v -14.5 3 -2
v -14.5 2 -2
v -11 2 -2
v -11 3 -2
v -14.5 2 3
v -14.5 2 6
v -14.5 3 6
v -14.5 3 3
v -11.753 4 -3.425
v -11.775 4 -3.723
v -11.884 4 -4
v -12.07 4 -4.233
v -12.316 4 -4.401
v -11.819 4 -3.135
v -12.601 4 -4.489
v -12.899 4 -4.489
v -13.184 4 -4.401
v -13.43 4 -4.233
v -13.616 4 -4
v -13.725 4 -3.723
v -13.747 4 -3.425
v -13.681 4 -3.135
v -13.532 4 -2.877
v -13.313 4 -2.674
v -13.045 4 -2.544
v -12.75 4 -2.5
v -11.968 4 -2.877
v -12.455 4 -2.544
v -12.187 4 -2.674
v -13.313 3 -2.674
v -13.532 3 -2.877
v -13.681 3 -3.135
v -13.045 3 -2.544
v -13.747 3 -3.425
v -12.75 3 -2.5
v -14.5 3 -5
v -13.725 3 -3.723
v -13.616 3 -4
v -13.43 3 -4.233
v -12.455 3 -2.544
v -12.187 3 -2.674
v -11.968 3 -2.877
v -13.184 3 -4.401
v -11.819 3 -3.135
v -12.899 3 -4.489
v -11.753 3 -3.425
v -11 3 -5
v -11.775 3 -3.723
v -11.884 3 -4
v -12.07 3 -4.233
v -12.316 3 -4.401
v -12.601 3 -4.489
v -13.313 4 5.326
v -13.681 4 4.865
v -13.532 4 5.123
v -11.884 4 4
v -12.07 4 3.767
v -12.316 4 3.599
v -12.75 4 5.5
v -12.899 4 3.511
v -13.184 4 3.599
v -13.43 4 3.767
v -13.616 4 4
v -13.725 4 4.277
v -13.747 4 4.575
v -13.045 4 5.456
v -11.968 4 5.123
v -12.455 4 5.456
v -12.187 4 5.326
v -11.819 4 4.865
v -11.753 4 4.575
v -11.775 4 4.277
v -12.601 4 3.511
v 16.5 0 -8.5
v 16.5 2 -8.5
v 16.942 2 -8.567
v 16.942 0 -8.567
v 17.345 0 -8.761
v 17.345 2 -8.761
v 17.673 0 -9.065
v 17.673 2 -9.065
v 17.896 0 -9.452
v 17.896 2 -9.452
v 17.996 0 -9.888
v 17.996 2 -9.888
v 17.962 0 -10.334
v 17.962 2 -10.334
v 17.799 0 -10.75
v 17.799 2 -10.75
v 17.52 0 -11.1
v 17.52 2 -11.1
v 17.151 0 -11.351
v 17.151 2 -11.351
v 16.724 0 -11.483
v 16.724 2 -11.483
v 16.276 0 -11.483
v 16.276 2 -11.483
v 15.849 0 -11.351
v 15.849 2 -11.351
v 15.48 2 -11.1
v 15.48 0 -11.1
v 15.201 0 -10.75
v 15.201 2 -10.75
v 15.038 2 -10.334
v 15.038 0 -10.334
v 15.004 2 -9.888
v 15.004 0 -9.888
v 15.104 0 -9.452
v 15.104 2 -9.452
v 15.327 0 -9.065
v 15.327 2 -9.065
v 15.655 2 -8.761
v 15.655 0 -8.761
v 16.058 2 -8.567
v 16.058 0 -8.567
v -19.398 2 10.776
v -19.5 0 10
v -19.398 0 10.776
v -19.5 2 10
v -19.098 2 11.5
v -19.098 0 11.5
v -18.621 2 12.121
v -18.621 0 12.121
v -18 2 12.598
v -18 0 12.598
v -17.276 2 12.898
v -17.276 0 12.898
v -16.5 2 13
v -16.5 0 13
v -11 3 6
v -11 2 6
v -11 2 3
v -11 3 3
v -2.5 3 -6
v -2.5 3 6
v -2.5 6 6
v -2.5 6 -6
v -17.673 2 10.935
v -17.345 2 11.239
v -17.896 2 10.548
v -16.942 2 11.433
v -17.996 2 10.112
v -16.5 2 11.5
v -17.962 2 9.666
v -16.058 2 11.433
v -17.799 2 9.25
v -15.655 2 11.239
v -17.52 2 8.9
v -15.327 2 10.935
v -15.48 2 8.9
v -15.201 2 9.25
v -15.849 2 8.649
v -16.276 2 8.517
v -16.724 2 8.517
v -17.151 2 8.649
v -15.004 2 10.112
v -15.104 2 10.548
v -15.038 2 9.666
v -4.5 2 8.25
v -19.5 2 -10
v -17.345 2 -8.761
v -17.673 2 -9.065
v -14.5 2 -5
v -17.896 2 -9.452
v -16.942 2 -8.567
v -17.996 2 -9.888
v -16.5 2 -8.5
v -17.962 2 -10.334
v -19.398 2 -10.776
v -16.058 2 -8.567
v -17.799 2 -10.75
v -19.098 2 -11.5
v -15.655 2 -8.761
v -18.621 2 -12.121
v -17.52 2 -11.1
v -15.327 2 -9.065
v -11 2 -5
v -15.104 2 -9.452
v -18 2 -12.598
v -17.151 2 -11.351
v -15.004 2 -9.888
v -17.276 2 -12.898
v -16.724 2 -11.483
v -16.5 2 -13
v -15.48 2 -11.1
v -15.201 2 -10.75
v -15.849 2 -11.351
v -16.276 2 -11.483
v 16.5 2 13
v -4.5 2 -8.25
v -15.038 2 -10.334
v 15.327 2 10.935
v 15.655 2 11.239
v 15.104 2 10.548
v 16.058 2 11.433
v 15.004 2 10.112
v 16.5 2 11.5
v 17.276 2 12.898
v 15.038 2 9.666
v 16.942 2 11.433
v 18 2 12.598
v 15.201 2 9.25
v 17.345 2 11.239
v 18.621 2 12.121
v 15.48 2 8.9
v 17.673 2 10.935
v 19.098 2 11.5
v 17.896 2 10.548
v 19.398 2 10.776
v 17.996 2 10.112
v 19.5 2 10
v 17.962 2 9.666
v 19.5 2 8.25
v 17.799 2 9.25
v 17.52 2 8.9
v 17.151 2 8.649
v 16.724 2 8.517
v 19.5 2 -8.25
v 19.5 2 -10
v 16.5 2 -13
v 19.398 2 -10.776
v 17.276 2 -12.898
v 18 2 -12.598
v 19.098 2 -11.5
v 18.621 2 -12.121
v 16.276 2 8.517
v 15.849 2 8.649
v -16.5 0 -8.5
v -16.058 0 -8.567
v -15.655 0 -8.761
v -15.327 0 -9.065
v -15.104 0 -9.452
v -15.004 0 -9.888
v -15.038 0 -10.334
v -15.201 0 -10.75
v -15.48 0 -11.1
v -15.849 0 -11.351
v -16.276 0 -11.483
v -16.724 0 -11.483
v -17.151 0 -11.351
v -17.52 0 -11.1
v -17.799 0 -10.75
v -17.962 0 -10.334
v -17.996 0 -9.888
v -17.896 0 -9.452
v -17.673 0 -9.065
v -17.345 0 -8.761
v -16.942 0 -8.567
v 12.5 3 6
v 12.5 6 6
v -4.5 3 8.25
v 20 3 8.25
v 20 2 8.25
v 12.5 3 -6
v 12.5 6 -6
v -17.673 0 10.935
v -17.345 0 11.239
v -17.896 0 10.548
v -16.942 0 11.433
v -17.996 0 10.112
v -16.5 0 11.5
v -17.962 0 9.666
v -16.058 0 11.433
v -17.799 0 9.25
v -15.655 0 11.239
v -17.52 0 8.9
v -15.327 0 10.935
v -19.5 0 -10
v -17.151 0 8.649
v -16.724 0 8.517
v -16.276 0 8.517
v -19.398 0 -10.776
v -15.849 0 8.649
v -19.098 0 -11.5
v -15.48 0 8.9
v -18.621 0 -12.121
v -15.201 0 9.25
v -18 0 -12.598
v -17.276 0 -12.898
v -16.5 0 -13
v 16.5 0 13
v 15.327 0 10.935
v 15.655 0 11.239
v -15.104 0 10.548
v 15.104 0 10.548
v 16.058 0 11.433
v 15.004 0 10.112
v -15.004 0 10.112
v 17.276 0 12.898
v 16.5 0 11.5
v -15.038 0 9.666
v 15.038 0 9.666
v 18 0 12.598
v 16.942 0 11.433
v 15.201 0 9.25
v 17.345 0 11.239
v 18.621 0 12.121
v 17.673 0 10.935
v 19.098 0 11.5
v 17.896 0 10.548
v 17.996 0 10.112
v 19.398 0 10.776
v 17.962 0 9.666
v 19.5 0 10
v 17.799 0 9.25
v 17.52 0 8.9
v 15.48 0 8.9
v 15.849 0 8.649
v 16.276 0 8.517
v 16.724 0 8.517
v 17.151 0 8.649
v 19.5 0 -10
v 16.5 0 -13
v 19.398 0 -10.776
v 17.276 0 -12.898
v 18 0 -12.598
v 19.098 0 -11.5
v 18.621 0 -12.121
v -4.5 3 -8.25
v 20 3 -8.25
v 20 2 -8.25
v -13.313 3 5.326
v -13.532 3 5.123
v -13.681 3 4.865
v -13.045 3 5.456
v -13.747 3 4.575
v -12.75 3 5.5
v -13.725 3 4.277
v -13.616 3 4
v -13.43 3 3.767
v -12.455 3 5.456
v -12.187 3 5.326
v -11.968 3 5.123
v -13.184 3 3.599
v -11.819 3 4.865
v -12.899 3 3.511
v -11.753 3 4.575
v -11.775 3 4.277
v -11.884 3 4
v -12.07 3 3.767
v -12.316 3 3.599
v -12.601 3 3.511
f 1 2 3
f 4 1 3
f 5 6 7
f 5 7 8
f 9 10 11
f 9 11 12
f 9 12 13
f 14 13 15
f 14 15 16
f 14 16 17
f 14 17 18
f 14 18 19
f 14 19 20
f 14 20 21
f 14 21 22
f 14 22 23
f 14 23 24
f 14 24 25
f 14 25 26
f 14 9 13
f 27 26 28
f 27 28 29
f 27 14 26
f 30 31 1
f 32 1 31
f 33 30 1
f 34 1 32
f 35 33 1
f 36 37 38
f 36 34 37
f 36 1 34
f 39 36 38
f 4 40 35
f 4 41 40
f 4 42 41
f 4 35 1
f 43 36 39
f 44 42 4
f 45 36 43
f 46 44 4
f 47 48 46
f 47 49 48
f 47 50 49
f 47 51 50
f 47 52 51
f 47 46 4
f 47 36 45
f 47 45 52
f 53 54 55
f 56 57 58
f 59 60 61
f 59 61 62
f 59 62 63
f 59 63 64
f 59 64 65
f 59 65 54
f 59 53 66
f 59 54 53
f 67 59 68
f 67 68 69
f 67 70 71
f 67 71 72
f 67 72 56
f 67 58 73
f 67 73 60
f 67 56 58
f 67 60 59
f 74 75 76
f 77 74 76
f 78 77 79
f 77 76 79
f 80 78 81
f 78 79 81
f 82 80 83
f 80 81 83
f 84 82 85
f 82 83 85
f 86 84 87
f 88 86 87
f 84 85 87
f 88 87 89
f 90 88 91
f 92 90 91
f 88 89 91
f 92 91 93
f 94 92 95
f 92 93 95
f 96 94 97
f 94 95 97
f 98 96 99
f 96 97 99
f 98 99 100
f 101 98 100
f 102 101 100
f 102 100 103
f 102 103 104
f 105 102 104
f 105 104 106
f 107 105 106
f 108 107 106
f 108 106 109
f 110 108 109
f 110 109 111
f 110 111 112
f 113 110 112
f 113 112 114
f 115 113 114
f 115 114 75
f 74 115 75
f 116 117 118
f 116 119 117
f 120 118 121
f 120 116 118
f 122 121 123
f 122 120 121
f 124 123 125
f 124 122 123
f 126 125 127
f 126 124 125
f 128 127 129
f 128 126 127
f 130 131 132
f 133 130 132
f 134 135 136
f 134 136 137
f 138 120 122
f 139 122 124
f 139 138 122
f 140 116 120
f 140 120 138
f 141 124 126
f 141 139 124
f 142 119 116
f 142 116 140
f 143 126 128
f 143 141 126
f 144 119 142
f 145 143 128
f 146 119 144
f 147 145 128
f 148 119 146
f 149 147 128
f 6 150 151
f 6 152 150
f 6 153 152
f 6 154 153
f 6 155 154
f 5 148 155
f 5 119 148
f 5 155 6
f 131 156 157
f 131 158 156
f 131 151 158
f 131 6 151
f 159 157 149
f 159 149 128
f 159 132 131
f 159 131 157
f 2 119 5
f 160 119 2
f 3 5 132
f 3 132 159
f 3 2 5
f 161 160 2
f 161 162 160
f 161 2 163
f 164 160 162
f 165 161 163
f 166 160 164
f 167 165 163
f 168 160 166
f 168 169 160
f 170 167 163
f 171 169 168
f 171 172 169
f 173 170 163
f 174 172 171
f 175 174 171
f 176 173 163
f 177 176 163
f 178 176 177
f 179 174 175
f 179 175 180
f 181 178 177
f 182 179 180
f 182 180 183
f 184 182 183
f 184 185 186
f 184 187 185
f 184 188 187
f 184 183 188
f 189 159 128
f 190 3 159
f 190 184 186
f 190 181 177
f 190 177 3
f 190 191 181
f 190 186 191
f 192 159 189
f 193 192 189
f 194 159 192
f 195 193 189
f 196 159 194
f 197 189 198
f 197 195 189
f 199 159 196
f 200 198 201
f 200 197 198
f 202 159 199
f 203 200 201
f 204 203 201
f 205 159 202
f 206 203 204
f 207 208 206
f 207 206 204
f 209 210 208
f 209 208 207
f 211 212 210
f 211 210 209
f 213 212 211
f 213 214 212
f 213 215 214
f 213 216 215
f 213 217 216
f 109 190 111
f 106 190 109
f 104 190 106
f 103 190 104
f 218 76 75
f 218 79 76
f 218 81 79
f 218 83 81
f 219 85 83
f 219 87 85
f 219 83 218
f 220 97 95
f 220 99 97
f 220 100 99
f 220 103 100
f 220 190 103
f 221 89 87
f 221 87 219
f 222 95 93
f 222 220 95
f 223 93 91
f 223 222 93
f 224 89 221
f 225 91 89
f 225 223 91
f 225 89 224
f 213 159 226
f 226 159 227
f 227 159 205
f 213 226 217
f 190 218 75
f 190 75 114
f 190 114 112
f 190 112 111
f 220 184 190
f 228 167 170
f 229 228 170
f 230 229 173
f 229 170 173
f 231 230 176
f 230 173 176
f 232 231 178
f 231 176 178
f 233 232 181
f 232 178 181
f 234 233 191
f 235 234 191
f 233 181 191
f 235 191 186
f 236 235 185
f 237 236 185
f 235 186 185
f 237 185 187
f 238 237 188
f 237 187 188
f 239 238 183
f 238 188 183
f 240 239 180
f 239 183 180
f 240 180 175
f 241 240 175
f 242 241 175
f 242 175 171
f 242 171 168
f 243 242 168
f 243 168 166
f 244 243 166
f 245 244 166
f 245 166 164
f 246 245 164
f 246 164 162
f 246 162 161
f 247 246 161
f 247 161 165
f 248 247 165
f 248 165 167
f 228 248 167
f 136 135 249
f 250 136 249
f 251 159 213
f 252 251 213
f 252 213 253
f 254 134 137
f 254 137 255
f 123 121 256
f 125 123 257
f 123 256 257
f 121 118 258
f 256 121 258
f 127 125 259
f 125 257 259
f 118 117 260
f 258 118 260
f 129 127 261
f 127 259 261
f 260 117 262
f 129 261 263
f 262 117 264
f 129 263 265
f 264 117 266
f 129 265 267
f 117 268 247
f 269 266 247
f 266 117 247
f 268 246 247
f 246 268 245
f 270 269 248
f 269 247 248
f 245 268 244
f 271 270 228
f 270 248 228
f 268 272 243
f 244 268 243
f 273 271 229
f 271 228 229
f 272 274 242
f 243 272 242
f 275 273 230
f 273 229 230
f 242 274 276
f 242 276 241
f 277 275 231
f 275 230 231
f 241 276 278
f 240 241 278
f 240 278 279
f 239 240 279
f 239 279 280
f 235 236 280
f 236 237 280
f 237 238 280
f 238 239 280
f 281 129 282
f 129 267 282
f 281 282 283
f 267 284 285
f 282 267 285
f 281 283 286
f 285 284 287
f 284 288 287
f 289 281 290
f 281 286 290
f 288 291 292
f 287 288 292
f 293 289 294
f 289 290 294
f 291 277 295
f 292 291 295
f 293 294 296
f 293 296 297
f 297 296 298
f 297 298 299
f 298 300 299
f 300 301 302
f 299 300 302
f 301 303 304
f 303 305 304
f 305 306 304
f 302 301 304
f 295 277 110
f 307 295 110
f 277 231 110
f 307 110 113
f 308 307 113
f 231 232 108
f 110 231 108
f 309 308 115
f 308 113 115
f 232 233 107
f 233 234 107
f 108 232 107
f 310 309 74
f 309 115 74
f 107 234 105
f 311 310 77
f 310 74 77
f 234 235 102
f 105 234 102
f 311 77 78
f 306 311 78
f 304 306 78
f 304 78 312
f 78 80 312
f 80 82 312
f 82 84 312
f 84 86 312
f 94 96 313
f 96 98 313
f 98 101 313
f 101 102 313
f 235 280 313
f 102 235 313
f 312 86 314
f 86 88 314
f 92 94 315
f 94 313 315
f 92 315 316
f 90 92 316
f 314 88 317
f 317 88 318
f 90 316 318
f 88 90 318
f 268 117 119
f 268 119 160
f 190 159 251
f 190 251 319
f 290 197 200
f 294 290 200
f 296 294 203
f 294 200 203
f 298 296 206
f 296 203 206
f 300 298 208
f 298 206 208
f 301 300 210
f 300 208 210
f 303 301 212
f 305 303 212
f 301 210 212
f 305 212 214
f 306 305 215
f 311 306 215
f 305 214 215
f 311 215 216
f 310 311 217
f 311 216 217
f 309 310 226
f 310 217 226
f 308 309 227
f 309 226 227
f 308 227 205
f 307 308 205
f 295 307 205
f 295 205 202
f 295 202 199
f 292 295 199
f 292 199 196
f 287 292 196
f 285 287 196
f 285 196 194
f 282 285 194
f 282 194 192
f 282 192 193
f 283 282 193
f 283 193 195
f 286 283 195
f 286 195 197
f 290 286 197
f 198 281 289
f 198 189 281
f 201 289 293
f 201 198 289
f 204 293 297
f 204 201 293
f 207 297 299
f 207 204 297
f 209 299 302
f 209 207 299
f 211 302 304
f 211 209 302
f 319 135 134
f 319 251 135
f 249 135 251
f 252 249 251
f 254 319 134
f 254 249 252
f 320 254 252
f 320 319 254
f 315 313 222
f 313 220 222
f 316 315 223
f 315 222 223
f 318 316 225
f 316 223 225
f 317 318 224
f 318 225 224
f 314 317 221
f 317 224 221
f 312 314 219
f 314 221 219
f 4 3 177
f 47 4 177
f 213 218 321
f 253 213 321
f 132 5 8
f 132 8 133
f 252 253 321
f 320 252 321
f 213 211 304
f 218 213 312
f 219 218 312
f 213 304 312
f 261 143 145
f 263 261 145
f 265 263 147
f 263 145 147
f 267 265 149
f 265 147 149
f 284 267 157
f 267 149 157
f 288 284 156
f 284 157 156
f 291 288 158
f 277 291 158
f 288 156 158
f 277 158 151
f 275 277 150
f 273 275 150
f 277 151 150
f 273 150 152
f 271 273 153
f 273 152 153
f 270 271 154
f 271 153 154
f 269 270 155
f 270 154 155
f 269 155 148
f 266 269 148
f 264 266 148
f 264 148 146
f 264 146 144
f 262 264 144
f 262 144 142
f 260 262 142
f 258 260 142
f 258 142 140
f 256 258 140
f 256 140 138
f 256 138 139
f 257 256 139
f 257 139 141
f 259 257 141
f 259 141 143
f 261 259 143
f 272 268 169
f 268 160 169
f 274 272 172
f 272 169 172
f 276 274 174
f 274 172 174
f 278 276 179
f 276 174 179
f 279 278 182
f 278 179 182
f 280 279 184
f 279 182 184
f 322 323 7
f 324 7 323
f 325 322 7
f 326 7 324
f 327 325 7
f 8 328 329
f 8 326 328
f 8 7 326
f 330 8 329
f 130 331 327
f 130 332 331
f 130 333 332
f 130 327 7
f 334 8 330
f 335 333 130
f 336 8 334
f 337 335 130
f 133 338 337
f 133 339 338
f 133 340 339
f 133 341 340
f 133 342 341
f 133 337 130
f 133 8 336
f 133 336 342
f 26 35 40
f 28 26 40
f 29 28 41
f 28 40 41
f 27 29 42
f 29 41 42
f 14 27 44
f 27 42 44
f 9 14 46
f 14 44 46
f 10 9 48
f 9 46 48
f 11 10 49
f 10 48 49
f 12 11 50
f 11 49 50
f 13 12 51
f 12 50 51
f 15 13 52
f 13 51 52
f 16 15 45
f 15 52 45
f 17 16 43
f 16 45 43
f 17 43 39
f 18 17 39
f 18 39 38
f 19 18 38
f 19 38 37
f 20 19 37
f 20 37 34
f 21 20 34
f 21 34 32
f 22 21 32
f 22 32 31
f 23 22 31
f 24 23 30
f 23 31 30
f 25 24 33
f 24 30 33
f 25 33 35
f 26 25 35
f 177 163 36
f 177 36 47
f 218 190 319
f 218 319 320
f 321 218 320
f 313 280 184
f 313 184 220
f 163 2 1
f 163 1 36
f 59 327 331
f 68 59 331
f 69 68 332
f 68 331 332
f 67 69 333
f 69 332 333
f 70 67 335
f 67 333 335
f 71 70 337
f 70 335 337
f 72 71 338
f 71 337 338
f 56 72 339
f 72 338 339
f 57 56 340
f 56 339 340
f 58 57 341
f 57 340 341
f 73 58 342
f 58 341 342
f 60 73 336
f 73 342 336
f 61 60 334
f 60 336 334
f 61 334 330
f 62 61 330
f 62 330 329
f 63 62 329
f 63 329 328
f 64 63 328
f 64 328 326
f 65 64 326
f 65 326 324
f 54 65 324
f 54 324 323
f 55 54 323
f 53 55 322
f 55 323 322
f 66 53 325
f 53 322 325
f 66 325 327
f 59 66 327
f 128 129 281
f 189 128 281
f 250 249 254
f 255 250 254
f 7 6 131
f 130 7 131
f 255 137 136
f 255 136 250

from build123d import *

# Parameters (mm, degrees)
SKETCH1_W           = 39
SKETCH1_H           = 26
BOSS_EXTRUDE1_DEPTH = 2
SKETCH2_R           = 1.5
CUT_EXTRUDE1_DEPTH  = 24.521266973
SKETCH3_W           = 24.5
SKETCH3_H           = 16.5
BOSS_EXTRUDE2_DEPTH = 1
SKETCH4_W           = 15
SKETCH4_H           = 12
BOSS_EXTRUDE3_DEPTH = 3
SKETCH5_W           = 3.5
SKETCH5_H           = 3
BOSS_EXTRUDE4_DEPTH = 1
SKETCH6_R           = 1
BOSS_EXTRUDE5_DEPTH = 1
FILLET1_R           = 3


with BuildPart() as part:
    # Sketch1 → Boss-Extrude1 (new body)
    with BuildSketch(Plane(origin=(0, 0, 0), x_dir=(1, 0, 0), z_dir=(0, 1, 0))):
        Rectangle(SKETCH1_W, SKETCH1_H)
    extrude(amount=BOSS_EXTRUDE1_DEPTH)

    # Sketch2 → Cut-Extrude1 (cut, through all)
    with BuildSketch(Plane(origin=(0, 2, 0), x_dir=(1, 0, 0), z_dir=(0, 1, 0))):
        with Locations(Location((-16.5, 10, 0), (0, 0, 270))):
            Circle(SKETCH2_R)
        with Locations(Location((-16.5, -10, 0), (0, 0, 270))):
            Circle(SKETCH2_R)
        with Locations(Location((16.5, -10, 0), (0, 0, 270))):
            Circle(SKETCH2_R)
        with Locations(Location((16.5, 10, 0), (0, 0, 270))):
            Circle(SKETCH2_R)
    extrude(amount=-CUT_EXTRUDE1_DEPTH, mode=Mode.SUBTRACT)

    # Sketch3 → Boss-Extrude2 (add)
    with BuildSketch(Plane(origin=(0, 2, 0), x_dir=(1, 0, 0), z_dir=(0, 1, 0))):
        with Locations((7.75, 0)):
            Rectangle(SKETCH3_W, SKETCH3_H)
    extrude(amount=BOSS_EXTRUDE2_DEPTH)

    # Sketch4 → Boss-Extrude3 (add)
    with BuildSketch(Plane(origin=(0, 3, 0), x_dir=(1, 0, 0), z_dir=(0, 1, 0))):
        with Locations((5, 0)):
            Rectangle(SKETCH4_W, SKETCH4_H)
    extrude(amount=BOSS_EXTRUDE3_DEPTH)

    # Sketch5 → Boss-Extrude4 (add)
    with BuildSketch(Plane(origin=(0, 2, 0), x_dir=(1, 0, 0), z_dir=(0, 1, 0))):
        with Locations((-12.75, 3.5)):
            Rectangle(SKETCH5_W, SKETCH5_H)
        with Locations((-12.75, -4.5)):
            Rectangle(SKETCH5_W, SKETCH5_H)
    extrude(amount=BOSS_EXTRUDE4_DEPTH)

    # Sketch6 → Boss-Extrude5 (add)
    with BuildSketch(Plane(origin=(0, 3, 0), x_dir=(1, 0, 0), z_dir=(0, 1, 0))):
        with Locations(Location((-12.75, 3.5, 0), (0, 0, 270))):
            Circle(SKETCH6_R)
        with Locations(Location((-12.75, -4.5, 0), (0, 0, 270))):
            Circle(SKETCH6_R)
    extrude(amount=BOSS_EXTRUDE5_DEPTH)

    # Fillet1
    fillet1_edges = [part.edges().sort_by_distance(p)[0] for p in [
        (19.5, 1, 13),
        (-19.5, 1, 13),
        (-19.5, 1, -13),
        (19.5, 1, -13),
    ]]
    fillet(fillet1_edges, radius=FILLET1_R)


solid = part.part
